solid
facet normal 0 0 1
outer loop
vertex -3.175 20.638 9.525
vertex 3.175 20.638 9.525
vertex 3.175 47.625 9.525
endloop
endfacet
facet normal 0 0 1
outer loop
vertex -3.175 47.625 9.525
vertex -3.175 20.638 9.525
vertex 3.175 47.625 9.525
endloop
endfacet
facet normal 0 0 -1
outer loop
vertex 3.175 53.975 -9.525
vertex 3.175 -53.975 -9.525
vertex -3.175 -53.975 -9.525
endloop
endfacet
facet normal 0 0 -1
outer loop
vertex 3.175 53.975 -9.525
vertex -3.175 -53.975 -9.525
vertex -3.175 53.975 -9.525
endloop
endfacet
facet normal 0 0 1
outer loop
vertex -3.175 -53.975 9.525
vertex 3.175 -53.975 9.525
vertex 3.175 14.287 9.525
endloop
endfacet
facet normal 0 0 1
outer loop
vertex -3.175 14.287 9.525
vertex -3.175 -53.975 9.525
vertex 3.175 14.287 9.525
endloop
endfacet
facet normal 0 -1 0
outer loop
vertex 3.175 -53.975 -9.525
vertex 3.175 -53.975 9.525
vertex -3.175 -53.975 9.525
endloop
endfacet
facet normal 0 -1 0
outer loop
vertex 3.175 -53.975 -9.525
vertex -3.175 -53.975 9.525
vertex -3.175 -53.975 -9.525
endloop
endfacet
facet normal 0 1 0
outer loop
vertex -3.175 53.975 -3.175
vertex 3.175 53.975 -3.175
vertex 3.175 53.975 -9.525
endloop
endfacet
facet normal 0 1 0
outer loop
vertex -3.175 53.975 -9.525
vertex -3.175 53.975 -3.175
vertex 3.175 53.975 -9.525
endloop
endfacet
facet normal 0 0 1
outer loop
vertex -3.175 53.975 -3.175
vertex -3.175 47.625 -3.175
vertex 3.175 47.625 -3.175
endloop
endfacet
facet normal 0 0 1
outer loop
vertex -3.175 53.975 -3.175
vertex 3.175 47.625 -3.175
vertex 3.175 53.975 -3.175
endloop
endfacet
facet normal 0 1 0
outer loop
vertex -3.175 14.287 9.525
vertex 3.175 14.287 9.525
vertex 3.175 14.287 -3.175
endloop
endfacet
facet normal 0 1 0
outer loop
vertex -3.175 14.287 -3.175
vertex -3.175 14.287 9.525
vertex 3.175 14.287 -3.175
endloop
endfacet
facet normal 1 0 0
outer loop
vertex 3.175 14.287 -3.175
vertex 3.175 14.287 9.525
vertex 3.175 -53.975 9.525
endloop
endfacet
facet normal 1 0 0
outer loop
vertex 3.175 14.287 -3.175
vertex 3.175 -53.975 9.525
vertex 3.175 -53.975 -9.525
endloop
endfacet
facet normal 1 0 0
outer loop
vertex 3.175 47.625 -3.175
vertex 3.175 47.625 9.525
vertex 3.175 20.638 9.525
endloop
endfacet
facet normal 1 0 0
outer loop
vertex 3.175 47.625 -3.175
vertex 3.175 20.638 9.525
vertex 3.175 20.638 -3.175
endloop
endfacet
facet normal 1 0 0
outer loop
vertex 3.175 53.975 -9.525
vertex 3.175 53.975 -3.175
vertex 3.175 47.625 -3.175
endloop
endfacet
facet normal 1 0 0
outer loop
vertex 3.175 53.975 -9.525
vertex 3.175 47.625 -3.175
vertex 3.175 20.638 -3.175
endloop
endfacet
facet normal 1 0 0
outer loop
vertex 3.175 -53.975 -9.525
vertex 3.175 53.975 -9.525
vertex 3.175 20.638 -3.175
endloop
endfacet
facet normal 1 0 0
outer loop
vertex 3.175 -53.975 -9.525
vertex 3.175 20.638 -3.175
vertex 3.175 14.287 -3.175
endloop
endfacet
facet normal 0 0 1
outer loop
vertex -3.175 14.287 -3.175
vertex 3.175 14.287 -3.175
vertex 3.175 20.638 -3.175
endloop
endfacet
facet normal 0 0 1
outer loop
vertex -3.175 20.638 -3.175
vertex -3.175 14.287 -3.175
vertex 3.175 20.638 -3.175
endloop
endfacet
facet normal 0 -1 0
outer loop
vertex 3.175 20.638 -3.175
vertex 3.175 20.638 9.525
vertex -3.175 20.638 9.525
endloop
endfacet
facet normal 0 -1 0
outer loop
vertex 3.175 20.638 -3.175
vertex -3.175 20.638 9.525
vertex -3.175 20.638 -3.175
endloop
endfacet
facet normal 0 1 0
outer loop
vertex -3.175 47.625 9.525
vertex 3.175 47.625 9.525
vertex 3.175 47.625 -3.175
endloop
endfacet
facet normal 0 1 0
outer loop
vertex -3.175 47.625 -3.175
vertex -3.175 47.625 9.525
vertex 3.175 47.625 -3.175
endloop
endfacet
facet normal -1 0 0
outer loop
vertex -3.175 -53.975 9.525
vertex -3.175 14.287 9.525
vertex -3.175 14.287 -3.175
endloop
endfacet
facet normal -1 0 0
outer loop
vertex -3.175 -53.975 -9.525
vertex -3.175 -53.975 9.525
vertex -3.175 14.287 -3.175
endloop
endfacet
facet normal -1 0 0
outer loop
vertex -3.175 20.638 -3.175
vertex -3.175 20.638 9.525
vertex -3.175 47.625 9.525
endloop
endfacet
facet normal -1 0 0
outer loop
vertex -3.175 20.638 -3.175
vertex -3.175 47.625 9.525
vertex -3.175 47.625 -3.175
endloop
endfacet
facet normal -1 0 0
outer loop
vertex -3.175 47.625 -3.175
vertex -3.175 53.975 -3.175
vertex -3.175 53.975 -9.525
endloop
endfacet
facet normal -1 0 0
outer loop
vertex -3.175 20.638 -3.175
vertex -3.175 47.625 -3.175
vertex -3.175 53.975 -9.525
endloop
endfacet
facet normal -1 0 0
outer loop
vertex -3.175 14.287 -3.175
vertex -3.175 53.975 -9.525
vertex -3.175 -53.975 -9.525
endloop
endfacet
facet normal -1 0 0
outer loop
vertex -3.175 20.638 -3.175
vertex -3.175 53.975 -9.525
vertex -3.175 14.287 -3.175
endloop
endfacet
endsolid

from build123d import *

# Parameters (mm, degrees)
SKETCH1_W           = 19.05
SKETCH1_H           = 107.95
BOSS_EXTRUDE1_DEPTH = 3.175
SKETCH2_W           = 12.7
SKETCH2_H           = 6.35
CUT_EXTRUDE1_DEPTH  = 7.35


with BuildPart() as part:
    # Sketch1 → Boss-Extrude1 (new body, symmetric)
    with BuildSketch(Plane(origin=(0, 0, 0), x_dir=(0, 0, -1), z_dir=(1, 0, 0))):
        Rectangle(SKETCH1_W, SKETCH1_H)
    extrude(amount=BOSS_EXTRUDE1_DEPTH, both=True)

    # Sketch2 → Cut-Extrude1 (cut, through all)
    with BuildSketch(Plane(origin=(3.175, 0, 0), x_dir=(0, 0, -1), z_dir=(1, 0, 0))):
        with Locations((-3.175, 50.8)):
            Rectangle(SKETCH2_W, SKETCH2_H)
        with Locations((-3.175, 17.4625)):
            Rectangle(SKETCH2_W, SKETCH2_H)
    extrude(amount=-CUT_EXTRUDE1_DEPTH, mode=Mode.SUBTRACT)


solid = part.part
